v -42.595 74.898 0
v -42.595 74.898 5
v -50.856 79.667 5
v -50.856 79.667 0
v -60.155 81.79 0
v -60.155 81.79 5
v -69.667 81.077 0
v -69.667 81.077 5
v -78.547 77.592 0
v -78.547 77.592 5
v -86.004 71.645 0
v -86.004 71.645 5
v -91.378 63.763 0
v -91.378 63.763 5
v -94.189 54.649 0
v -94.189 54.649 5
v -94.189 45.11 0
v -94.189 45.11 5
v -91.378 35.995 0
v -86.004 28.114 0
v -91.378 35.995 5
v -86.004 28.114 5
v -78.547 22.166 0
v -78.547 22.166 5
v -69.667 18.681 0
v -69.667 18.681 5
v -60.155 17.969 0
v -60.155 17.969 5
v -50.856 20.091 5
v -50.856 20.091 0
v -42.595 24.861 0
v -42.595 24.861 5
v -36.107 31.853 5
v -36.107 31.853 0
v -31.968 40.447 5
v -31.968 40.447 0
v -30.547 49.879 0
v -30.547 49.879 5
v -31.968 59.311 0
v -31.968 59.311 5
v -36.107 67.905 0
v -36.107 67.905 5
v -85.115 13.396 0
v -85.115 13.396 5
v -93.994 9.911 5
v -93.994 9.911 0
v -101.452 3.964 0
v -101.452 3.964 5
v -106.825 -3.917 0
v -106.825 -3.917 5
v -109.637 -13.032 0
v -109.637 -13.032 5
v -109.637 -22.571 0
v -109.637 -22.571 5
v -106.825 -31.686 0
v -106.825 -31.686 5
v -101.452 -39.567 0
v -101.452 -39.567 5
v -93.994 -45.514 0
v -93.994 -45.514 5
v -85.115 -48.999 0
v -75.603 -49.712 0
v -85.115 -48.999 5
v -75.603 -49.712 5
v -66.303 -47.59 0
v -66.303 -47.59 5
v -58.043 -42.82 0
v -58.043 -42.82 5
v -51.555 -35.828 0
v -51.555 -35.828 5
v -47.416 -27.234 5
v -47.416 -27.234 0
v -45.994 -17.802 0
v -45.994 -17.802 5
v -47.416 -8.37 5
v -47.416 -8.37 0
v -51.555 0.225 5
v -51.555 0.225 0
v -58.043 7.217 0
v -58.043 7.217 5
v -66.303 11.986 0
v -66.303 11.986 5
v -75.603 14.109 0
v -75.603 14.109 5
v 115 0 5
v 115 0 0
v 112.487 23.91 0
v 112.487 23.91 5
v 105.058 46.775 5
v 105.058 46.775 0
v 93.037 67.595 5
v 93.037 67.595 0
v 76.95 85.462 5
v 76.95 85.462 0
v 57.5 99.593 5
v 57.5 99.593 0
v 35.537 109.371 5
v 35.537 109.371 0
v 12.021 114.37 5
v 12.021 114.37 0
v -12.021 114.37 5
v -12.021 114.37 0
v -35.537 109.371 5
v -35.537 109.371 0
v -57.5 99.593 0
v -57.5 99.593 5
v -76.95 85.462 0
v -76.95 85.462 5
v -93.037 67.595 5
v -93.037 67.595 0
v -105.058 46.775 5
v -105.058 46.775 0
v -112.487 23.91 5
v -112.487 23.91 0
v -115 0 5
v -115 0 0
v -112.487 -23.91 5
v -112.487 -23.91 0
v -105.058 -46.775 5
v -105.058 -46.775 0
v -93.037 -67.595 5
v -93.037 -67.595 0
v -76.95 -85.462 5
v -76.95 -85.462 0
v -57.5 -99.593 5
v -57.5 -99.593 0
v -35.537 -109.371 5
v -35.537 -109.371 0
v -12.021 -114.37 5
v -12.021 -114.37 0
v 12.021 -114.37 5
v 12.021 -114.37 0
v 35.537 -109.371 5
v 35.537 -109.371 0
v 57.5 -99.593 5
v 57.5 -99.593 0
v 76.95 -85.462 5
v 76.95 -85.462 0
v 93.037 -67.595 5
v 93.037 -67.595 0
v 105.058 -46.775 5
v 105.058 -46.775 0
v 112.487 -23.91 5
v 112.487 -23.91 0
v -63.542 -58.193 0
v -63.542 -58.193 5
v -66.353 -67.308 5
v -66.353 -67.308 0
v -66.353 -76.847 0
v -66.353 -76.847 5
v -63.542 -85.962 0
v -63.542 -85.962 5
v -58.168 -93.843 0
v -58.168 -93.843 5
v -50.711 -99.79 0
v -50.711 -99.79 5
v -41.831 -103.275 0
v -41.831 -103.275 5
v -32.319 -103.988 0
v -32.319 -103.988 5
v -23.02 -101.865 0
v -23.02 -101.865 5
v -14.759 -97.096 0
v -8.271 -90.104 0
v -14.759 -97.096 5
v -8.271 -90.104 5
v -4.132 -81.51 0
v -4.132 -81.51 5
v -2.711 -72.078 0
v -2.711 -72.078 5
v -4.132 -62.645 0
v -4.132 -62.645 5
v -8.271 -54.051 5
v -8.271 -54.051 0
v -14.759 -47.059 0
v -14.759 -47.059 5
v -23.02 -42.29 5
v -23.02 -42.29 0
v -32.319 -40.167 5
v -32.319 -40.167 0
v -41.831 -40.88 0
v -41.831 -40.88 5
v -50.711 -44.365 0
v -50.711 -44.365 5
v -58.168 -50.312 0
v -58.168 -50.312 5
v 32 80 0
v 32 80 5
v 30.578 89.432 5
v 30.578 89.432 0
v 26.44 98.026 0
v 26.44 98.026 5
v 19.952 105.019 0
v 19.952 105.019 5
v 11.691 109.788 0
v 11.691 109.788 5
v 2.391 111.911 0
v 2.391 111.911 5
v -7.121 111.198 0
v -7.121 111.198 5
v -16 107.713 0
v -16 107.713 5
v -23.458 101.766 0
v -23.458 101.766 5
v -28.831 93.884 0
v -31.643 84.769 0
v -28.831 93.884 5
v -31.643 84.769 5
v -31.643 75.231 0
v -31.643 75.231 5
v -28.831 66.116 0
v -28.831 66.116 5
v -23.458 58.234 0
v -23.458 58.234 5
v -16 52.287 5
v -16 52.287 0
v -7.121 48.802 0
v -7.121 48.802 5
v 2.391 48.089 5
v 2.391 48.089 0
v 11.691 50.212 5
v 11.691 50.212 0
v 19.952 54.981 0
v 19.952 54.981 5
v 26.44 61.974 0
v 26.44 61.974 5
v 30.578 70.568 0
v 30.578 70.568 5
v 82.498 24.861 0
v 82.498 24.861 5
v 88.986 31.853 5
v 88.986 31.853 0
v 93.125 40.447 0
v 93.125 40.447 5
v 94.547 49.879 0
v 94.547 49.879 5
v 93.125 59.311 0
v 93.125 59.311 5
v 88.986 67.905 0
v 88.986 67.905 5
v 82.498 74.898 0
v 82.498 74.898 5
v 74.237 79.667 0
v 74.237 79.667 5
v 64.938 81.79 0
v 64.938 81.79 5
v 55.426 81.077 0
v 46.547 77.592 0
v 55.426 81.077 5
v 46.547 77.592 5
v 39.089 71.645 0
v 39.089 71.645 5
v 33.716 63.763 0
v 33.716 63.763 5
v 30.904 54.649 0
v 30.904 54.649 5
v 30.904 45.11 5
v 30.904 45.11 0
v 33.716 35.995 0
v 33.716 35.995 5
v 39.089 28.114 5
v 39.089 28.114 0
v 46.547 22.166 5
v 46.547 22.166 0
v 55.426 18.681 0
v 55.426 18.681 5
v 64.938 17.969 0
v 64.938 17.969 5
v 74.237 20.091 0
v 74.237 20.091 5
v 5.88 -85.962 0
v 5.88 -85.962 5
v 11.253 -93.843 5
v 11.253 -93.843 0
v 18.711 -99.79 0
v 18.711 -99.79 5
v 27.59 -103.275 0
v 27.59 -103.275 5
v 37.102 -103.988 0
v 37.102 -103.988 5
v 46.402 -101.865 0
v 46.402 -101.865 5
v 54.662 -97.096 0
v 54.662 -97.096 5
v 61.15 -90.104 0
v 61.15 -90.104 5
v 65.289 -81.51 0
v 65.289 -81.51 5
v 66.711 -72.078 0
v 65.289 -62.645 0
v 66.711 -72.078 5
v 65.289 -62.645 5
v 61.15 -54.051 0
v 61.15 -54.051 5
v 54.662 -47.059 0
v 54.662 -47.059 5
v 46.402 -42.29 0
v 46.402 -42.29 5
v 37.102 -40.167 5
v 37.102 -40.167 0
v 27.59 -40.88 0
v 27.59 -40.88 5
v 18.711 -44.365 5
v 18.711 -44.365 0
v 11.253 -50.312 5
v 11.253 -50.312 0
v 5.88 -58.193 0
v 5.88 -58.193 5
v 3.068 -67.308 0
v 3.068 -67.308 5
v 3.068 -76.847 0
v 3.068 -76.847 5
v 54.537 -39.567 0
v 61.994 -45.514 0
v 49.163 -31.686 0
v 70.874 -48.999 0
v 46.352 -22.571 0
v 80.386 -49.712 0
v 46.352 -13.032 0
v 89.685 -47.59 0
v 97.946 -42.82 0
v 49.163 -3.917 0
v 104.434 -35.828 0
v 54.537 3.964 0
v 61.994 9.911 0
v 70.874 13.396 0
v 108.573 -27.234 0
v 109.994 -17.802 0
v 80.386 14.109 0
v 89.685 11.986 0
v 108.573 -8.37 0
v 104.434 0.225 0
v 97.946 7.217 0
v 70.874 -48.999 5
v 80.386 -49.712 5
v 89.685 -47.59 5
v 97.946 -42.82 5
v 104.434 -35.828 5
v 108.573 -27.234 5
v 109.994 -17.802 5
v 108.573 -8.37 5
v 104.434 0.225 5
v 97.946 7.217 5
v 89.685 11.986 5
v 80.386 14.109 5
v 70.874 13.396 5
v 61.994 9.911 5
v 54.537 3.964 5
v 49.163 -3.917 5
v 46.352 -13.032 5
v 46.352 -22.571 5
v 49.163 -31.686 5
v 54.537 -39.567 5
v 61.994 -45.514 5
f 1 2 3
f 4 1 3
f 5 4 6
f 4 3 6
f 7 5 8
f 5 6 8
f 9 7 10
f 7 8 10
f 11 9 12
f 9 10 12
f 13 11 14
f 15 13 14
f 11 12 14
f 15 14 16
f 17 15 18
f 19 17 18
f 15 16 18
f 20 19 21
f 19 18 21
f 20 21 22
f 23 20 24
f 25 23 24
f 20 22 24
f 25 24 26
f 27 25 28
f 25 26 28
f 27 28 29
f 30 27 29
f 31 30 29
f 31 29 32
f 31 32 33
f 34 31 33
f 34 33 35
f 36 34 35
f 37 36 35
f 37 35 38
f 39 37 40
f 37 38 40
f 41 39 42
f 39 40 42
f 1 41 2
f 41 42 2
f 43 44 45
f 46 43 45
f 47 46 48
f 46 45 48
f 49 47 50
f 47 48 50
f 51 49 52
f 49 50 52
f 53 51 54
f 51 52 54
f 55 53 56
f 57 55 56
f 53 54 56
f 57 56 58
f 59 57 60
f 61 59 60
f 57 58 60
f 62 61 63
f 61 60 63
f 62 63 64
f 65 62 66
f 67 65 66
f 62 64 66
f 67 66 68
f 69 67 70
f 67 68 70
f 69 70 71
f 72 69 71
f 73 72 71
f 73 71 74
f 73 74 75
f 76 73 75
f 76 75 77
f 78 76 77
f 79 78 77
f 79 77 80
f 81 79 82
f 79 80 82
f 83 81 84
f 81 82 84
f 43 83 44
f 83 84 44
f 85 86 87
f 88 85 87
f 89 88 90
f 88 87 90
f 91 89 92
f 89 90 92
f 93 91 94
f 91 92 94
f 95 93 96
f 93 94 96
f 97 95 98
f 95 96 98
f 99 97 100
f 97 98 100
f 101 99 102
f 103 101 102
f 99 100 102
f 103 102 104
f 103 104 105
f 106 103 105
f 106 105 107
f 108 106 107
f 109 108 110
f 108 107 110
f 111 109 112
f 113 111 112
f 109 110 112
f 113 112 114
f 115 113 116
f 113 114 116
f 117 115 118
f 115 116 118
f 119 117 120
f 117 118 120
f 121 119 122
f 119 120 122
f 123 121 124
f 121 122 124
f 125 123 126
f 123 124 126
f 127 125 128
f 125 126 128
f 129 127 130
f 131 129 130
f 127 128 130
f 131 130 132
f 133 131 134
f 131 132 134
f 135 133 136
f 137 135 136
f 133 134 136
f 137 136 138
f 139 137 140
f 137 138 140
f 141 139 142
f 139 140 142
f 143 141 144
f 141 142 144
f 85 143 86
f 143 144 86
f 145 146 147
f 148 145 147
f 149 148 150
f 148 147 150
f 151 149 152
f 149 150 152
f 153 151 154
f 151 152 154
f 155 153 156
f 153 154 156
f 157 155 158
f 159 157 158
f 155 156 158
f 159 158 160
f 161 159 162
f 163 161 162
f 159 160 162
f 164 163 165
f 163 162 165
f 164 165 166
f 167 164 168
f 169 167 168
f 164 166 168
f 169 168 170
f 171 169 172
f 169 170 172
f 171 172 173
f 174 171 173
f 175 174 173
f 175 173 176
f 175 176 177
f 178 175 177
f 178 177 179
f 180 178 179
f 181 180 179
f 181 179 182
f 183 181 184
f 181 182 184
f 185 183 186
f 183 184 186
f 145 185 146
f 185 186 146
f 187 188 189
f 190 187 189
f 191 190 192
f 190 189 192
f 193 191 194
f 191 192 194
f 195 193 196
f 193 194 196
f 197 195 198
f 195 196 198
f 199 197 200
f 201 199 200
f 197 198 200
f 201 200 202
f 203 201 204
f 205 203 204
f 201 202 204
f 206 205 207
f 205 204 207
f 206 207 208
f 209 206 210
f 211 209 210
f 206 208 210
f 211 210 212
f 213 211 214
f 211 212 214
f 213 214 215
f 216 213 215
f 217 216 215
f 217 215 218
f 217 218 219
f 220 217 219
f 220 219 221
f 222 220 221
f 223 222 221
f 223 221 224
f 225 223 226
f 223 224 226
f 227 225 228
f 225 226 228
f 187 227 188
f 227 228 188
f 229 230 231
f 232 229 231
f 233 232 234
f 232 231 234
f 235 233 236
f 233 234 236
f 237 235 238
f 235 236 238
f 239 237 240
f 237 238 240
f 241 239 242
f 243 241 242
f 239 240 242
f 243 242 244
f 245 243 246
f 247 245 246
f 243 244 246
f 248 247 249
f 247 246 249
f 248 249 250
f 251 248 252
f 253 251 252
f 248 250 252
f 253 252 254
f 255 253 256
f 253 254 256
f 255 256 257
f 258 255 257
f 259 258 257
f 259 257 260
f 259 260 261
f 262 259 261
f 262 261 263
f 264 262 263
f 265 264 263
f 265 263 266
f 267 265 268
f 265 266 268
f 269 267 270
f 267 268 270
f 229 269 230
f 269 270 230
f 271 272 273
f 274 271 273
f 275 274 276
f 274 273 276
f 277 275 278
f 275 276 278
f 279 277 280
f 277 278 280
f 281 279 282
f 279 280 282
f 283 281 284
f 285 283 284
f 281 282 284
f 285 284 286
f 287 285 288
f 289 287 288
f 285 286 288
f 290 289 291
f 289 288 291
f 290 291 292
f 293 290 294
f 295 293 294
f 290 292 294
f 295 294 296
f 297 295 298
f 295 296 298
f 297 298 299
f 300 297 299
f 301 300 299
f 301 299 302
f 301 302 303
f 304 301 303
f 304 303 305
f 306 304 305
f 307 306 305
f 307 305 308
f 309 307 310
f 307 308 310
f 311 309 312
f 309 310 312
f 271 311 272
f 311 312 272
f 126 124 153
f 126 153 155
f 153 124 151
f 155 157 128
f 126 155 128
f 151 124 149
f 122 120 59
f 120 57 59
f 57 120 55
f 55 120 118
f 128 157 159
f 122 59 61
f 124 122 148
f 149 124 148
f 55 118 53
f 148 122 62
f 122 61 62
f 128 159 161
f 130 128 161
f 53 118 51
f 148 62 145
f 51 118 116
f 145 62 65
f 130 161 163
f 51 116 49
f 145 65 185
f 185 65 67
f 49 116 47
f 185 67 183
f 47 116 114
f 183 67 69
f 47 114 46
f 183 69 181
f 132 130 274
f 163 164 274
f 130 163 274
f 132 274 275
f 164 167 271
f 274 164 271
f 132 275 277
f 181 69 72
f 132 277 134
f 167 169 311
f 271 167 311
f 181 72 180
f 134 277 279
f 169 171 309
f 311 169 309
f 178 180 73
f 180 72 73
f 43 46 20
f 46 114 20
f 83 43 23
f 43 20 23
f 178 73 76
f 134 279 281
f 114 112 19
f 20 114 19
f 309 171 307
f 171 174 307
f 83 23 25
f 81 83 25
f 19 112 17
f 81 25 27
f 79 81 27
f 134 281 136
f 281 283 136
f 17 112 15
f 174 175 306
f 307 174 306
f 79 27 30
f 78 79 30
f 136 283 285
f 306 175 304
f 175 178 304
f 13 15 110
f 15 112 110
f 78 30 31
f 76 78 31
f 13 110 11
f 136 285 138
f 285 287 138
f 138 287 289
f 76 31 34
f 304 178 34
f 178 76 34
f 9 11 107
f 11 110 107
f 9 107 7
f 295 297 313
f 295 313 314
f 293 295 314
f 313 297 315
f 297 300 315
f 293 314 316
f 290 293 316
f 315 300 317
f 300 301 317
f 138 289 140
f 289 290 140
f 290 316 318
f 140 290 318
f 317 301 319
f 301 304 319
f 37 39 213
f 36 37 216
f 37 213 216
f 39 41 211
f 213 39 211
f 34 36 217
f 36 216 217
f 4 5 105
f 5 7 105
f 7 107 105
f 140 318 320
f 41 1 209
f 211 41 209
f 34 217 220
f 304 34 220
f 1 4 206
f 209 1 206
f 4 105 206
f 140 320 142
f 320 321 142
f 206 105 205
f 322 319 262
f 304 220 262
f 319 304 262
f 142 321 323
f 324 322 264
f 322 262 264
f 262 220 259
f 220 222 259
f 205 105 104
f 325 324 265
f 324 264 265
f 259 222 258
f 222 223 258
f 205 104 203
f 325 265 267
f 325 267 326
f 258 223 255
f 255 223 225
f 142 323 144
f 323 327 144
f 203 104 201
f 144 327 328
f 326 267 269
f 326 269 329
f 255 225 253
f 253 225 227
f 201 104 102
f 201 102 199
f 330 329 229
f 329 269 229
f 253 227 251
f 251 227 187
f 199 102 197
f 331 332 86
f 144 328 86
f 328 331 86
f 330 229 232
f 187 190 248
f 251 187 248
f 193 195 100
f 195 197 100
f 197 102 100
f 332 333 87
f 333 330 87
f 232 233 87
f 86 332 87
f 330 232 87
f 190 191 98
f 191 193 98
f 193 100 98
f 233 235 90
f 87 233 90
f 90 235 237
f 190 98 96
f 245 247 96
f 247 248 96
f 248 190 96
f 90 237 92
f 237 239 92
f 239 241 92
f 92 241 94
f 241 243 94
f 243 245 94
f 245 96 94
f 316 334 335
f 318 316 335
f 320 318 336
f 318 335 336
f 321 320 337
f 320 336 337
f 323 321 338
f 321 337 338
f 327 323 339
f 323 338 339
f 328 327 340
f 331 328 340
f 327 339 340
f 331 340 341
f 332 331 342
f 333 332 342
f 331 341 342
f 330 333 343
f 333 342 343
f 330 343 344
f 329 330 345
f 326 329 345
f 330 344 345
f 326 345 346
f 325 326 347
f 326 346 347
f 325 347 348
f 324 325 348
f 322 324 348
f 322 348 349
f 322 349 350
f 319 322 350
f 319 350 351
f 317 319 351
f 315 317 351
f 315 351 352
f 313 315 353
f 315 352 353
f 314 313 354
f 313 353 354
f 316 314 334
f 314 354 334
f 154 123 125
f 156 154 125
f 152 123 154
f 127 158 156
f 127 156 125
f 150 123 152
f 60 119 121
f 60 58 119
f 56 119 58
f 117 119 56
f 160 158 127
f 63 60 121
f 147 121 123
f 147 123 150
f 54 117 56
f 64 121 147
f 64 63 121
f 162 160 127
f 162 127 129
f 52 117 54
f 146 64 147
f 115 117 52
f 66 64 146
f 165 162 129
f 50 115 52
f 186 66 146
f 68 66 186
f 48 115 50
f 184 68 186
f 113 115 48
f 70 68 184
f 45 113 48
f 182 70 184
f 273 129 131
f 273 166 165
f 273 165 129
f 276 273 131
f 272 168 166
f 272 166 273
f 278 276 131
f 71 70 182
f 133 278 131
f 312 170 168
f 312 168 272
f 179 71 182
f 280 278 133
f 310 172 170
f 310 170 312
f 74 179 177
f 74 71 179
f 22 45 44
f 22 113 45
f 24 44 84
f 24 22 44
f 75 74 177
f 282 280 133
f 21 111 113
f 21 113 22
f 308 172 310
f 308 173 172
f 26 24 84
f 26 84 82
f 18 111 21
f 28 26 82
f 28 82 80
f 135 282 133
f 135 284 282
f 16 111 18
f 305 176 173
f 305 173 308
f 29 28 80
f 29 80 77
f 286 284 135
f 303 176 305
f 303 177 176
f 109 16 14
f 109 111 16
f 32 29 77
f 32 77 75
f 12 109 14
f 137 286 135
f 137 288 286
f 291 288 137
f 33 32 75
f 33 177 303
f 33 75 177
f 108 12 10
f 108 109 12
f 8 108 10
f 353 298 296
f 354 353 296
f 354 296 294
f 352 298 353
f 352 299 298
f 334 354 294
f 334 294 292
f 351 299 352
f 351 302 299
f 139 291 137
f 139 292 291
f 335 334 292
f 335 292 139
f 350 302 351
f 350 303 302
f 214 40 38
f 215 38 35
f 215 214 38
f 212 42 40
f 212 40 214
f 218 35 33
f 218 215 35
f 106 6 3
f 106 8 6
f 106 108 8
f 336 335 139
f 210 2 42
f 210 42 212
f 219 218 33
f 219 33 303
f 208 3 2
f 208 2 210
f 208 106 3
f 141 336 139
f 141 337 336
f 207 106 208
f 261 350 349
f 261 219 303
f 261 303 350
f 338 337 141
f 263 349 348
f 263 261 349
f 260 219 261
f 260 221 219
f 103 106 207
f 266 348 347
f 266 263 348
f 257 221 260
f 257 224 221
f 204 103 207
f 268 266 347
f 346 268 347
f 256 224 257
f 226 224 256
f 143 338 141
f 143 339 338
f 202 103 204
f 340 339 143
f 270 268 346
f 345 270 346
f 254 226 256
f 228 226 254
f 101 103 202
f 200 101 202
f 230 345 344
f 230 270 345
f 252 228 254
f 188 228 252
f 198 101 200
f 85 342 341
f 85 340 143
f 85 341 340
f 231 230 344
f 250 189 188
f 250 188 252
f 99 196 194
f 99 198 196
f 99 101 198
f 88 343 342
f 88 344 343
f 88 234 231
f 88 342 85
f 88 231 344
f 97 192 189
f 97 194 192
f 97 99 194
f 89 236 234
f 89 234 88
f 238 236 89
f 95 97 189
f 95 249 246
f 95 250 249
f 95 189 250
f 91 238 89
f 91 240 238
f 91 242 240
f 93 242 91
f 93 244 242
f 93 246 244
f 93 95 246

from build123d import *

# Parameters (mm, degrees)
F0_R            = 115
F1_DEPTH        = 5
F2_R            = 32
F3_DEPTH        = 5
F3_COPIES_COUNT = 7


# Not quite as in the source:
# - a pattern or mirror of a feature is missing from the dataset's text; its kind, count and spacing are read off the source's solid


with BuildPart() as f1:
    # F0 (on Top) → F1 (new body)
    with BuildSketch(Plane.XY):
        Circle(F0_R)
    extrude(amount=F1_DEPTH)

    # F2 (on face) → F3 (cut)
    with BuildSketch(Plane.XY.offset(5)):
        with Locations((0, 80)):
            Circle(F2_R)
    f3 = extrude(amount=-F3_DEPTH, mode=Mode.SUBTRACT)

    # F3_copies: F3 ×7 about axis
    f3_copies_axis = Axis((0, 0, 0), (0, 0, 1))
    for i in range(1, F3_COPIES_COUNT):
        add(f3.rotate(f3_copies_axis, i * 360 / F3_COPIES_COUNT), mode=Mode.SUBTRACT)


solid = f1.part
